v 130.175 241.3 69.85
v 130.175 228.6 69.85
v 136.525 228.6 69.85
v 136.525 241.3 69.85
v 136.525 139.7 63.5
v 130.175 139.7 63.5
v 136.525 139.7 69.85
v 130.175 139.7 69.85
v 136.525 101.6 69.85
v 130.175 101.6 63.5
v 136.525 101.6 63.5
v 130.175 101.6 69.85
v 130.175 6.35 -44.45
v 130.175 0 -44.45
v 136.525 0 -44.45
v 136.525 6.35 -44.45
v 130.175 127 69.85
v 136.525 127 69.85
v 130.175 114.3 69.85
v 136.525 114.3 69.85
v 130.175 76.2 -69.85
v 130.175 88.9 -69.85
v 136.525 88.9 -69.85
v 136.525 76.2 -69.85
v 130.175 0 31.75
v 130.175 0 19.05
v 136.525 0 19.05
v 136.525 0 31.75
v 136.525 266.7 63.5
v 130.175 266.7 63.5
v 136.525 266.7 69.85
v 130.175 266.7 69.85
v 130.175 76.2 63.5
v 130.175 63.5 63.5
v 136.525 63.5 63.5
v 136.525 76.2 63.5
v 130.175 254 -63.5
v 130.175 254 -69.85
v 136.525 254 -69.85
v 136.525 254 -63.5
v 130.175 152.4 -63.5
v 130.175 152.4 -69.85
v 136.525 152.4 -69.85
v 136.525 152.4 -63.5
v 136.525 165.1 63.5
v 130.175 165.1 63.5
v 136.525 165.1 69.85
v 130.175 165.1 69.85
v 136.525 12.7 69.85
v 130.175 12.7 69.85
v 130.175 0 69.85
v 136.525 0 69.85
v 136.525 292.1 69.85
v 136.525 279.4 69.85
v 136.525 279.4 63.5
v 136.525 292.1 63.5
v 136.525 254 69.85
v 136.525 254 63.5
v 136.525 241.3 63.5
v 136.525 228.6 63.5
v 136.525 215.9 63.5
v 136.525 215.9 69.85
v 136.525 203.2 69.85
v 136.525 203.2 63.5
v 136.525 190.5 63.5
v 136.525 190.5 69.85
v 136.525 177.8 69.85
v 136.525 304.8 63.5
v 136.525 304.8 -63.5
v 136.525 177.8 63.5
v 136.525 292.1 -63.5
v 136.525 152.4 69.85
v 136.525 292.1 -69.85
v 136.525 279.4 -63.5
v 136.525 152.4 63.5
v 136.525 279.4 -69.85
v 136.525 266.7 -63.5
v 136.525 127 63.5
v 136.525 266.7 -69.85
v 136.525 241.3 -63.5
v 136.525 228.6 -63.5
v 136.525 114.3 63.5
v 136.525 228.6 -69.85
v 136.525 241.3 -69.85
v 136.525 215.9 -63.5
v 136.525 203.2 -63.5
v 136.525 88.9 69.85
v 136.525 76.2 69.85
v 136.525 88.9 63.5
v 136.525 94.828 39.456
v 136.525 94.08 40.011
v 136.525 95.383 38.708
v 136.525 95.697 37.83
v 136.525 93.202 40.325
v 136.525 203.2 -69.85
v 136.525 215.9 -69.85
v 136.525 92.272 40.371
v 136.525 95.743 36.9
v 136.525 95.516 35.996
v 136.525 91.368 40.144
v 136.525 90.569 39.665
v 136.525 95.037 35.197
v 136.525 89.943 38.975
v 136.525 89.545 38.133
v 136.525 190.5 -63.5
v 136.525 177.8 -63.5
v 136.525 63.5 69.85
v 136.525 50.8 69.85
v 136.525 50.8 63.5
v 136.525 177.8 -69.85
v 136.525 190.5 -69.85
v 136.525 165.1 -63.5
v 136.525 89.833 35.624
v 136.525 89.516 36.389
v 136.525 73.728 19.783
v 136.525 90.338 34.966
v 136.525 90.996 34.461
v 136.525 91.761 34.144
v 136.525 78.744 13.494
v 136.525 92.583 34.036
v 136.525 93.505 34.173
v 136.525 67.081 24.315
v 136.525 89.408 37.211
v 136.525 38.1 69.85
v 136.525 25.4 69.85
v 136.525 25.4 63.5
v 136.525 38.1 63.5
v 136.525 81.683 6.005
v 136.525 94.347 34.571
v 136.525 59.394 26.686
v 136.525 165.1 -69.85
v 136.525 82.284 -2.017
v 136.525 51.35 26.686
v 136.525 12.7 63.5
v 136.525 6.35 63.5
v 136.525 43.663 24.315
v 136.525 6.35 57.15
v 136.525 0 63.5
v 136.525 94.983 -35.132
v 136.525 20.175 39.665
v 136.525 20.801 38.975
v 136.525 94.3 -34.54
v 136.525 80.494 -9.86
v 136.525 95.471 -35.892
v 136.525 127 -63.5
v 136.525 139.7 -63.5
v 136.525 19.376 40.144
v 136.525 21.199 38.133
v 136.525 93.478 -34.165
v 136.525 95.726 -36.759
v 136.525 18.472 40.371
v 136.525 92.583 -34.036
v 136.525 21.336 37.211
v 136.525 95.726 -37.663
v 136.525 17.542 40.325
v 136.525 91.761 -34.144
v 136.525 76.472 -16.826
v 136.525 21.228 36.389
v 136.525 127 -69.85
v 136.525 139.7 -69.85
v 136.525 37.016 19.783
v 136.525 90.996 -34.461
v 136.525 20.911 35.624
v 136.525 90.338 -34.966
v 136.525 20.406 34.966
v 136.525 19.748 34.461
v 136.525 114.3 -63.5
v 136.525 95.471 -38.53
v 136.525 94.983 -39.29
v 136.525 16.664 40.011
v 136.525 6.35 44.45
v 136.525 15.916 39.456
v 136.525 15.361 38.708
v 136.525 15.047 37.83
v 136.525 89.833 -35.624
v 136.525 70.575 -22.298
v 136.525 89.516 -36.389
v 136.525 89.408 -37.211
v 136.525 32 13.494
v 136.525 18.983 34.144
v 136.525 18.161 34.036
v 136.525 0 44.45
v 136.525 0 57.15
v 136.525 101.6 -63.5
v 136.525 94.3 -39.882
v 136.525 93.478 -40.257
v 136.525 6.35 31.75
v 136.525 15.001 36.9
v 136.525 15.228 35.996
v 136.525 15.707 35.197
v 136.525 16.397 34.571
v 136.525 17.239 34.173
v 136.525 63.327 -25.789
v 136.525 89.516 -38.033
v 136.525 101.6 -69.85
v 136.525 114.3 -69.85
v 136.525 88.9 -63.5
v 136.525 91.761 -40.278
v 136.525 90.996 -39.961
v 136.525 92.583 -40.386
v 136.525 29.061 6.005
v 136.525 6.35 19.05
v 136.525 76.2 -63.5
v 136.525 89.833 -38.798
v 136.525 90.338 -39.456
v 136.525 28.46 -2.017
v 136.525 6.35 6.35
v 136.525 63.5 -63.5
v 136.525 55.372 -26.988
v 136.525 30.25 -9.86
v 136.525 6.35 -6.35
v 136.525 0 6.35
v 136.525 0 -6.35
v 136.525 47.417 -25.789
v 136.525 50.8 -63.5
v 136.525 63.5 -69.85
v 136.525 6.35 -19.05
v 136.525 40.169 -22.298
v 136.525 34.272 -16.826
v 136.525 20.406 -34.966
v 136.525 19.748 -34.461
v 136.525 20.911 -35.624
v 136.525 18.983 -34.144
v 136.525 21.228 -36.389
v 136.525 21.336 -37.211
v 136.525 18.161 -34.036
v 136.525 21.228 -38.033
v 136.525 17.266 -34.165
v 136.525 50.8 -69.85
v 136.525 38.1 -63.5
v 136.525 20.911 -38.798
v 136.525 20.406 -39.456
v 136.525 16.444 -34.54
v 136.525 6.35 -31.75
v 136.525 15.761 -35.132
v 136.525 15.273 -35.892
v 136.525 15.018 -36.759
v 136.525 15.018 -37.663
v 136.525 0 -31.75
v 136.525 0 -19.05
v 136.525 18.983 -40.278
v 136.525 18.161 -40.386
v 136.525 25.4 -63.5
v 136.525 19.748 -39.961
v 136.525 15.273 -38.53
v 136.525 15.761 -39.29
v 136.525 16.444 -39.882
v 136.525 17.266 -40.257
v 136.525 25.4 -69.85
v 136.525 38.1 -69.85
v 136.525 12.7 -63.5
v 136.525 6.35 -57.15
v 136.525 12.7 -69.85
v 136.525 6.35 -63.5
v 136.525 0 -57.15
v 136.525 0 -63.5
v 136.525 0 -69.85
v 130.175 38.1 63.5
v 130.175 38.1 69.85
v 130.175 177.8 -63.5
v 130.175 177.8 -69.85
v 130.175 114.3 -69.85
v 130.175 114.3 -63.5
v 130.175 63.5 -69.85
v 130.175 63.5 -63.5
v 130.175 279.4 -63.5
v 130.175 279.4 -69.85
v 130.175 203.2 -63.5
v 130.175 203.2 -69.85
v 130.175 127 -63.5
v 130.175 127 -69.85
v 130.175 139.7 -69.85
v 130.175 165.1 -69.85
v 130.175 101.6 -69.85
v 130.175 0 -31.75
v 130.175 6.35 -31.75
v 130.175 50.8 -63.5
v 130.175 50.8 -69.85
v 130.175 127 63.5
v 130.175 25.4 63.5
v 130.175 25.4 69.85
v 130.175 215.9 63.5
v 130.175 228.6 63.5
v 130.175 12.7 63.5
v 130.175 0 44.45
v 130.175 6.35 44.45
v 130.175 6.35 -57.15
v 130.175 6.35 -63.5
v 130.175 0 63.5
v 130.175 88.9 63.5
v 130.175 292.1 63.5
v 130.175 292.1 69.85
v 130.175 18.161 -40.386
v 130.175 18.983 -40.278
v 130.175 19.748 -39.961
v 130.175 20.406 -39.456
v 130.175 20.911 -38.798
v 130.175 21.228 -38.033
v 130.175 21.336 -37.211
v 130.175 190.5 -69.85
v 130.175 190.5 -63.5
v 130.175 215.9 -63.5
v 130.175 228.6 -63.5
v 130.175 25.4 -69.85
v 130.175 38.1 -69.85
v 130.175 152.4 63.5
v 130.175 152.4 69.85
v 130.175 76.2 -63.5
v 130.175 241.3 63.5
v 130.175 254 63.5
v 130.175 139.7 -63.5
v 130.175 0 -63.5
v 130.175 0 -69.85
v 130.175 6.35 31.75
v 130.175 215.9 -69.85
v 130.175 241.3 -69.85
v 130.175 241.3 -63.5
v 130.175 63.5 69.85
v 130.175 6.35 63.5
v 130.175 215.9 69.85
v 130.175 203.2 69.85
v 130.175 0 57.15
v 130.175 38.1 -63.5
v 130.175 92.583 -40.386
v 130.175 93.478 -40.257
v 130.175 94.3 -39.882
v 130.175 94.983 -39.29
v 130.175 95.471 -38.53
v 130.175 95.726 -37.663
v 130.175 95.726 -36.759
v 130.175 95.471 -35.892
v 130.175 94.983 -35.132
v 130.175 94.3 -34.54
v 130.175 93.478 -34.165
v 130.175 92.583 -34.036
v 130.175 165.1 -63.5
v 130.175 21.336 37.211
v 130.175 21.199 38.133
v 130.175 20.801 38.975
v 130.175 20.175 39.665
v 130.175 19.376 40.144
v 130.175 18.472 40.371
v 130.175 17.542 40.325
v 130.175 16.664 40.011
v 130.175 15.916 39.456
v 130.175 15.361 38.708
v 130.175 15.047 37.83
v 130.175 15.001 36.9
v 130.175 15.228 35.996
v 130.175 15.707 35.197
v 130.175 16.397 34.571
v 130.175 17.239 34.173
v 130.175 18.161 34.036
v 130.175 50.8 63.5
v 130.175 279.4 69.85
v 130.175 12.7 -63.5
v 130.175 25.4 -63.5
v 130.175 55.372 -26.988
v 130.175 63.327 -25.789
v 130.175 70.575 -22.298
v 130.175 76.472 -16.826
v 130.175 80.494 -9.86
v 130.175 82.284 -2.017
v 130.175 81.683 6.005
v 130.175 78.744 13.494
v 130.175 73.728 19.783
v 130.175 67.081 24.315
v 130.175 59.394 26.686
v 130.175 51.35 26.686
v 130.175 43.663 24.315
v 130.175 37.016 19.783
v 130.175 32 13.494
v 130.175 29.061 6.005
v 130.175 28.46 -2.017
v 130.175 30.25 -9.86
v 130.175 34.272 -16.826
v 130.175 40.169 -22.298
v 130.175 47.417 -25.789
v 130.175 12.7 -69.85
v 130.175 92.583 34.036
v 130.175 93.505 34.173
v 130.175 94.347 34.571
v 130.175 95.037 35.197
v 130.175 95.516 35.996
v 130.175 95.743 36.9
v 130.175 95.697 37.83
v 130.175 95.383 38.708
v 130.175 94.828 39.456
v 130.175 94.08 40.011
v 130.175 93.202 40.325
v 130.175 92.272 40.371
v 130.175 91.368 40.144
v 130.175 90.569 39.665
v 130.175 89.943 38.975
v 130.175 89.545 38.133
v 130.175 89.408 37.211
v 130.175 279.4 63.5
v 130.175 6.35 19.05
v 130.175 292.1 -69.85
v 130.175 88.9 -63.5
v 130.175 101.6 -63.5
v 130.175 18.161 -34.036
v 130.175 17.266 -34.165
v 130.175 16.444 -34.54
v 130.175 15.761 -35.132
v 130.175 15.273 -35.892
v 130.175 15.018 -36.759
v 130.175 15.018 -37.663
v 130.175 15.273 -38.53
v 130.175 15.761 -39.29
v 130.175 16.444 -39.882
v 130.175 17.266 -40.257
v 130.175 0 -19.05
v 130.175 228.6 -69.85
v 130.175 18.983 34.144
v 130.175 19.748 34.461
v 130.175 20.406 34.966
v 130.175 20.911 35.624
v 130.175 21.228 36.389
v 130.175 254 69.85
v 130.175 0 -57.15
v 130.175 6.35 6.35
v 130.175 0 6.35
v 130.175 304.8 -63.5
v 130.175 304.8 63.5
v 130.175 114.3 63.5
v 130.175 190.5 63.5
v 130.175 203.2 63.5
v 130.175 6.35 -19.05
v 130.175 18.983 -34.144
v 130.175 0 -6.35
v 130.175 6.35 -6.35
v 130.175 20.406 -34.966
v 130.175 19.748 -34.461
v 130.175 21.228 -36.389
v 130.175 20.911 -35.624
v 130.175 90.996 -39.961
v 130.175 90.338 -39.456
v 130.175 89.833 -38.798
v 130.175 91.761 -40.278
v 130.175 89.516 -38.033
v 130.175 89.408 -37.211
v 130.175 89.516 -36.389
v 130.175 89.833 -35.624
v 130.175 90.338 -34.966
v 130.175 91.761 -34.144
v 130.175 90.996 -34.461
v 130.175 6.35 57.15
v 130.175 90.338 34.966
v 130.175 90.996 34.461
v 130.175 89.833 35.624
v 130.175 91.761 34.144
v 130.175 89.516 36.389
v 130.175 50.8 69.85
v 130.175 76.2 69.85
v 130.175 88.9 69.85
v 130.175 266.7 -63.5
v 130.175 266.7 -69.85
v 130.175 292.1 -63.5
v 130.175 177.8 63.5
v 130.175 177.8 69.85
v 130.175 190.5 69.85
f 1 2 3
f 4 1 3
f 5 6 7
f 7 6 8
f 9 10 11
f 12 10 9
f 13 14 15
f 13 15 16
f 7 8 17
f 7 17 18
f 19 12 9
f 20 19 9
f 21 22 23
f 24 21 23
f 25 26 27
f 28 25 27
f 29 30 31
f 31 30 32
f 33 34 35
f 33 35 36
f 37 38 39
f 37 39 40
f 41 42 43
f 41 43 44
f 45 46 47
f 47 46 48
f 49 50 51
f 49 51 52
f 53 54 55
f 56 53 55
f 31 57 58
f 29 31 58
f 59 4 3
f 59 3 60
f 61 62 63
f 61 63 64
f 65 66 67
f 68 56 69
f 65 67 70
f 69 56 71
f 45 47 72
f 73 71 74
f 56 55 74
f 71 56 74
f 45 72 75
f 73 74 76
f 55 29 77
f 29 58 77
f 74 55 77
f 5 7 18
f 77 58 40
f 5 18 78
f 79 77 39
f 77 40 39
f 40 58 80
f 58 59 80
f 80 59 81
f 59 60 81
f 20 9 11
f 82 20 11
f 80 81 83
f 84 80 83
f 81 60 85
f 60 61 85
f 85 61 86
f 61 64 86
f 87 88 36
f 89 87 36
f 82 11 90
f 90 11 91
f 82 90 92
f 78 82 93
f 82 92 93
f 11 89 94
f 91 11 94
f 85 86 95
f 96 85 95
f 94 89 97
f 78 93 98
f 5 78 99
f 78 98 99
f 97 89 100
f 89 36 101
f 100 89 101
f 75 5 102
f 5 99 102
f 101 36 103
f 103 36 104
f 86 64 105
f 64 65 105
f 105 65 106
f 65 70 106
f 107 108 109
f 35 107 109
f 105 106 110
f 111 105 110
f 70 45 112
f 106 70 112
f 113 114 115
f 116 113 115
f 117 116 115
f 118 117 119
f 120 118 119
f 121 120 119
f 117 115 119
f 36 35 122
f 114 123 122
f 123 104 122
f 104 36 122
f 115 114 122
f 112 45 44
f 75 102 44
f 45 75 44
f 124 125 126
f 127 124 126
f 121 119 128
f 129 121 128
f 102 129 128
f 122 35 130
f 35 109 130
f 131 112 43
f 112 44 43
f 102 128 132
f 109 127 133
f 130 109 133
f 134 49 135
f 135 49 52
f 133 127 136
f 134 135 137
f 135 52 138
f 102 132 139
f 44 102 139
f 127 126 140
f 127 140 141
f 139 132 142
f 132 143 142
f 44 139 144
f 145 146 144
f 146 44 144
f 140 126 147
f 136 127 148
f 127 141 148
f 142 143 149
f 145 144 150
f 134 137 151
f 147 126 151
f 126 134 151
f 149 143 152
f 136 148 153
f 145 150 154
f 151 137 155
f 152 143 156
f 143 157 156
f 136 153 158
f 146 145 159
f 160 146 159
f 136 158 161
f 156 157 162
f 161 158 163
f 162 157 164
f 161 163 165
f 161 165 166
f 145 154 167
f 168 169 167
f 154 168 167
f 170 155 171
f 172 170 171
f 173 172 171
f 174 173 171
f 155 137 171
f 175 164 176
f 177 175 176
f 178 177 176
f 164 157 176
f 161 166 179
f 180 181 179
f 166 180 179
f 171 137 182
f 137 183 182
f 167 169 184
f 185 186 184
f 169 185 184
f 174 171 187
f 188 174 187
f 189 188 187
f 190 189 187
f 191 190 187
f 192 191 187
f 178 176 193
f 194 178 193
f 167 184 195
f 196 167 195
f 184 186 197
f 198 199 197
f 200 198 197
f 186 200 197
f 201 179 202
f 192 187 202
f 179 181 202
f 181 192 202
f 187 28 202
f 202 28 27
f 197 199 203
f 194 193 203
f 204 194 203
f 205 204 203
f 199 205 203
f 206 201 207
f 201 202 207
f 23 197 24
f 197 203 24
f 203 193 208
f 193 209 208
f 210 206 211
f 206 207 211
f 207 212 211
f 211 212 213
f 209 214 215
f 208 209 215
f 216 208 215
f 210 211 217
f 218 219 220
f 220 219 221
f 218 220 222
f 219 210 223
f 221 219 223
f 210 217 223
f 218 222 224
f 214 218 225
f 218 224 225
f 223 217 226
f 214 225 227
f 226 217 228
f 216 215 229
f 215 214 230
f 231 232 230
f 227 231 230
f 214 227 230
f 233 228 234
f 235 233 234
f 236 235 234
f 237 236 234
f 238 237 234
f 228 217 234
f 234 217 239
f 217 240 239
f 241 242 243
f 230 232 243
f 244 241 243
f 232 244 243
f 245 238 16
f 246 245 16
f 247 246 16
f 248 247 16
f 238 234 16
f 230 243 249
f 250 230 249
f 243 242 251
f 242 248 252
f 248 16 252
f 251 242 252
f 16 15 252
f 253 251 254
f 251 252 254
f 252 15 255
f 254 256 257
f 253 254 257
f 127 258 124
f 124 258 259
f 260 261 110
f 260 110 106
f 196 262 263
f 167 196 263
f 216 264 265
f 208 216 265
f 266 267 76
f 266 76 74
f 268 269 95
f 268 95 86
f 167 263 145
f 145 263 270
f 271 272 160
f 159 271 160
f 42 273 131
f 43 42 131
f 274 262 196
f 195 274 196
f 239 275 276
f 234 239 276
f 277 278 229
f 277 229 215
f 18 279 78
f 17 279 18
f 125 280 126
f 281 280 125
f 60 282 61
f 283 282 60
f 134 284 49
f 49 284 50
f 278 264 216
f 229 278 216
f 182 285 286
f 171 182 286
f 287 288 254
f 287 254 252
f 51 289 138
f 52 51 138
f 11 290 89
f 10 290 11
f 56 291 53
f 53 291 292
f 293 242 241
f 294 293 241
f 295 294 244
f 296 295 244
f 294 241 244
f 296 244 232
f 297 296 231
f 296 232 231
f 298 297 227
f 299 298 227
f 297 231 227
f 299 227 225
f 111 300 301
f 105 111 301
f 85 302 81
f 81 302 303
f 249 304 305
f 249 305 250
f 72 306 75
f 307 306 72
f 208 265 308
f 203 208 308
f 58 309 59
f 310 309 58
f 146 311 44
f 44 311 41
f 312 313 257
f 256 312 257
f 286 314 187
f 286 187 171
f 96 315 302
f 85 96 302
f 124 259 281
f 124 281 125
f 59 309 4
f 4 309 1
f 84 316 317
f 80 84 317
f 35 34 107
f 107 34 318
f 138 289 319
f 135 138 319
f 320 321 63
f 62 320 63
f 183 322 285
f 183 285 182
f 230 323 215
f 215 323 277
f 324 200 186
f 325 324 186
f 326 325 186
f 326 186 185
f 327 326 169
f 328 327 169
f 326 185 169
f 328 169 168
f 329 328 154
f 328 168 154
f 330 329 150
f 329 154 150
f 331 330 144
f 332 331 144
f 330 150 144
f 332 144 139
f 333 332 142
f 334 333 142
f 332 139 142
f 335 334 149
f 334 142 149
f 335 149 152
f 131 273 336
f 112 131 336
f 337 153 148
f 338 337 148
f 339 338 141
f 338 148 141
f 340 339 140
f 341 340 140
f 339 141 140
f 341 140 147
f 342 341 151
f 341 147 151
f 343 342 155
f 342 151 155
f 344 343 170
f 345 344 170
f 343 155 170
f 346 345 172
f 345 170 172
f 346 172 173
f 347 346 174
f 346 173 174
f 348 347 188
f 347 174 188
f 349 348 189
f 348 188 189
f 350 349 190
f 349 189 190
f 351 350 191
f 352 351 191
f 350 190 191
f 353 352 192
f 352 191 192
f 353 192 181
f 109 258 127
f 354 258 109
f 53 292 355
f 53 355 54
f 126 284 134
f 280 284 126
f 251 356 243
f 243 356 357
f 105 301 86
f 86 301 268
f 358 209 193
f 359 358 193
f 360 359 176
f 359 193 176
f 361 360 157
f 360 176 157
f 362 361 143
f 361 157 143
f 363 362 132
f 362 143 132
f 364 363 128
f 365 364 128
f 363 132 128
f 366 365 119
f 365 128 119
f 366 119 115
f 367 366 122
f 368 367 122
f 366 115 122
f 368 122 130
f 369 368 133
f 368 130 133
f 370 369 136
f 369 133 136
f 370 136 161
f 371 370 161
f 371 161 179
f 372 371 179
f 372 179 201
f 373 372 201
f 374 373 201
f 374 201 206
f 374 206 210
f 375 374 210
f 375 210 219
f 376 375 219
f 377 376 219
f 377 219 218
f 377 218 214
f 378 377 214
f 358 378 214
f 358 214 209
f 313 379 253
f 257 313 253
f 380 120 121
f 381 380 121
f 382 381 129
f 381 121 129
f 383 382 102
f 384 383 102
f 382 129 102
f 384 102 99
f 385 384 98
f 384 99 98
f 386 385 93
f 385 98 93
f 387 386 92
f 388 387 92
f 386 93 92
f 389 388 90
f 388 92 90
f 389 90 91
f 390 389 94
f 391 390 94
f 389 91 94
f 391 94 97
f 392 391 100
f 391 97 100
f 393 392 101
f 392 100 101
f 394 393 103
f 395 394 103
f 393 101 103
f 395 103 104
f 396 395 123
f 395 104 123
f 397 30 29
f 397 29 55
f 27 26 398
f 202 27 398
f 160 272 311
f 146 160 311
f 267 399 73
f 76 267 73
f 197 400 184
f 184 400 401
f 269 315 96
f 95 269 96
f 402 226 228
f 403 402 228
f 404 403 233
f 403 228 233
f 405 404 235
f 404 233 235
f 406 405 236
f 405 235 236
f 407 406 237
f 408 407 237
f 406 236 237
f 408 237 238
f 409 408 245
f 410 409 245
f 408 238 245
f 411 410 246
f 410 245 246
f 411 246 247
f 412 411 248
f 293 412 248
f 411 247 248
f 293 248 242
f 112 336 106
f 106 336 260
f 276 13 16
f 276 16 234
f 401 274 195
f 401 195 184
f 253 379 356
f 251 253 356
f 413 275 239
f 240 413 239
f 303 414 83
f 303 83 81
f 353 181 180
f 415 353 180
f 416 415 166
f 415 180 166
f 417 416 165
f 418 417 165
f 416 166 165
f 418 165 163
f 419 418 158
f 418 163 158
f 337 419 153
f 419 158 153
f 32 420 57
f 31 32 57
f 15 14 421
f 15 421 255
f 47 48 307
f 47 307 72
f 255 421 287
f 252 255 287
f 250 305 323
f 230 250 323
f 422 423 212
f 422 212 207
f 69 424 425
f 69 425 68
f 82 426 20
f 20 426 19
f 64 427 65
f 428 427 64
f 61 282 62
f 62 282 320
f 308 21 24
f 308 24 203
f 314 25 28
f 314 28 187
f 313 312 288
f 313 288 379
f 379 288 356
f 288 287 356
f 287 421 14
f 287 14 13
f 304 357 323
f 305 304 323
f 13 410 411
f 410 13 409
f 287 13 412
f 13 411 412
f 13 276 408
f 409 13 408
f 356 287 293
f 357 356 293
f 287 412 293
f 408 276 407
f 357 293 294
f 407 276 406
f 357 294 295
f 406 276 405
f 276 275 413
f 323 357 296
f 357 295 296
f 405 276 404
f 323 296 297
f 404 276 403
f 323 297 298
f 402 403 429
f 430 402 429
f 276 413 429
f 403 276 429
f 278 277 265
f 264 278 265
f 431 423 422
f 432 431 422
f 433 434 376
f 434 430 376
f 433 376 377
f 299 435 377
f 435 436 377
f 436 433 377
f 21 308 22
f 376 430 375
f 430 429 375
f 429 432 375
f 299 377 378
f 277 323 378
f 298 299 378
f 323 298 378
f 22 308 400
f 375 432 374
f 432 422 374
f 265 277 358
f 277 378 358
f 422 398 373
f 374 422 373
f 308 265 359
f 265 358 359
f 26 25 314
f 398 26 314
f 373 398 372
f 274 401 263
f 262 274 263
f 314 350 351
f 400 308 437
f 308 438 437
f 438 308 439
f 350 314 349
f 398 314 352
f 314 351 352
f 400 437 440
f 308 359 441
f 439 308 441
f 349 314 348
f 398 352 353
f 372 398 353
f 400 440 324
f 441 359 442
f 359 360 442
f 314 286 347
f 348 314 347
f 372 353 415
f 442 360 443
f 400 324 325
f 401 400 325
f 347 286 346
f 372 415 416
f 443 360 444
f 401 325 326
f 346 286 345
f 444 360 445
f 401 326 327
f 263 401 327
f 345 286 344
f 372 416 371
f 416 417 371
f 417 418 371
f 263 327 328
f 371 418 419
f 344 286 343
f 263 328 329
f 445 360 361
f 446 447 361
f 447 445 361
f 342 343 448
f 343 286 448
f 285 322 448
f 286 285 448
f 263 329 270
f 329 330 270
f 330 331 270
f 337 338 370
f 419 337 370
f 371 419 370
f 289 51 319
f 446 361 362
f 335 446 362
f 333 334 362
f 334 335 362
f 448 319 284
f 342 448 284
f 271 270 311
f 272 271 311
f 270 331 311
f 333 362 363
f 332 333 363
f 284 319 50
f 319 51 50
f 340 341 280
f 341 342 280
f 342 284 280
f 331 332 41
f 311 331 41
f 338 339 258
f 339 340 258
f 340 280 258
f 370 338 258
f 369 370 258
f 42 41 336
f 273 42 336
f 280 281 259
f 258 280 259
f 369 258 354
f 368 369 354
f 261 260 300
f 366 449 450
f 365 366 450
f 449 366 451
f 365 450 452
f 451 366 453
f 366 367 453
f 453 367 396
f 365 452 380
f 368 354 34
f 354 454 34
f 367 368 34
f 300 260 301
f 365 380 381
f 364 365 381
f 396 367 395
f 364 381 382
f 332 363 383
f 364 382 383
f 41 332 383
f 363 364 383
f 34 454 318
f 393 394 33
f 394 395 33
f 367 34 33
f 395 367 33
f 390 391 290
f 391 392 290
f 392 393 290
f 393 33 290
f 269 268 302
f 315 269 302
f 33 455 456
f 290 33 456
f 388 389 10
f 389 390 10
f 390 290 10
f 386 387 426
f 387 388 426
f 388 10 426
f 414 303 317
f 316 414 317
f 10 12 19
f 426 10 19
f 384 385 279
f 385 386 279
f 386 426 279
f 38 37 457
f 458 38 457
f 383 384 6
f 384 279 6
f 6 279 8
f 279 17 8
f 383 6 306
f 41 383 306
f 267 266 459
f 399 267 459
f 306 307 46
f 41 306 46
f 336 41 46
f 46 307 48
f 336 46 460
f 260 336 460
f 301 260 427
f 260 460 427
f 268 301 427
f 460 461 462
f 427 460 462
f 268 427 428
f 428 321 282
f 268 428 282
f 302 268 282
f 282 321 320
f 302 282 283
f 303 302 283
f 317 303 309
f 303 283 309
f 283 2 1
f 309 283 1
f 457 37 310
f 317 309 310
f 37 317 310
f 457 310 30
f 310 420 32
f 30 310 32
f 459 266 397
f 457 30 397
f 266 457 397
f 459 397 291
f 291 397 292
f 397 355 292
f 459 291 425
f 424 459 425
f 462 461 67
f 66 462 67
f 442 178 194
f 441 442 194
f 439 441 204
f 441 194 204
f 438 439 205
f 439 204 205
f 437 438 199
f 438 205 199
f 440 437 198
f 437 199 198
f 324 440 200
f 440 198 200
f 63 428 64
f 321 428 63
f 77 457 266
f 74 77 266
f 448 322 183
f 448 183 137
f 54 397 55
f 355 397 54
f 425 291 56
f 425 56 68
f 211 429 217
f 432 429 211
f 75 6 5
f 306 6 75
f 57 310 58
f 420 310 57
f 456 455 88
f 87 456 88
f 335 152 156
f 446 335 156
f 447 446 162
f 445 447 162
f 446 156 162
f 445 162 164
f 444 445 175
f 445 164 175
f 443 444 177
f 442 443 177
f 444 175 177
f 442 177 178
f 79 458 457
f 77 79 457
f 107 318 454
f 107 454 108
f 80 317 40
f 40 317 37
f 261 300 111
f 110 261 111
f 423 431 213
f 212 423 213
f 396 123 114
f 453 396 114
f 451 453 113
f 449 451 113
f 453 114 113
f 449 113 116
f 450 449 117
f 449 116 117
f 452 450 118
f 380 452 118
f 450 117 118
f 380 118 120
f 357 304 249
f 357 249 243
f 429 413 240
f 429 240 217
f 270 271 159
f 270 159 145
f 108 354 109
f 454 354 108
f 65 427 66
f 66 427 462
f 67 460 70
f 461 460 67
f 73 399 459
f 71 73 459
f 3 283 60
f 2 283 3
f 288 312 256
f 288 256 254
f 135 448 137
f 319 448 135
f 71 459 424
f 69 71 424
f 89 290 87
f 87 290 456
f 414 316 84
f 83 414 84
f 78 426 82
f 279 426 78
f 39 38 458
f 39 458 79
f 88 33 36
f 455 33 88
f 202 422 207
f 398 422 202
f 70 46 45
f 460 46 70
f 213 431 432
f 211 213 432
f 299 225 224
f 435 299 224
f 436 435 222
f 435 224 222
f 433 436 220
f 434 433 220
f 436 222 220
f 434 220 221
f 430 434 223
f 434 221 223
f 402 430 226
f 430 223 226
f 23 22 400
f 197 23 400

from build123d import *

# Parameters (mm, degrees)
SKETCH1_W              = 273.05
SKETCH1_H              = 139.7
BOSS_EXTRUDE1_DEPTH    = 6.35
SKETCH2_W              = 273.05
SKETCH2_H              = 139.7
SKETCH2_W_2            = 260.35
SKETCH2_H_2            = 127
BOSS_EXTRUDE2_DEPTH    = 298.45
SKETCH3_W              = 6.35
SKETCH3_H              = 16.933333333
SKETCH3_H_2            = 16.933333334
DOOR_SLOT_DEPTH        = 12.7
DOOR_GUIDE_HOLES_REACH = 361.617
SKETCH4_W              = 6.35
SKETCH4_H              = 15.875
LEVER_HOLES_W          = 9.652
LEVER_HOLES_H          = 6.35
LEVER_HOLES_W_2        = 6.35
CUT_EXTRUDE1_DEPTH     = 363.019620497
CUT_EXTRUDE2_REACH     = 417.137
SKETCH7_R              = 26.9875
CUT_EXTRUDE3_REACH     = 417.137
SKETCH8_R              = 3.175
SKETCH16_W             = 326.476778096
SKETCH16_H             = 315.233565403
CUT_EXTRUDE10_DEPTH    = 363.019620497
LEFT_RIGHT_W           = 6.35
LEFT_RIGHT_H           = 6.35
LEFT_RIGHT_W_2         = 12.7
LEFT_RIGHT_H_2         = 12.7
CUT_EXTRUDE11_DEPTH    = 416.136561869


with BuildPart() as part:
    # Sketch1 → Boss-Extrude1 (new body)
    with BuildSketch(Plane(origin=(0, 0, 0), x_dir=(1, 0, 0), z_dir=(0, 1, 0))):
        Rectangle(SKETCH1_W, SKETCH1_H)
    extrude(amount=BOSS_EXTRUDE1_DEPTH)

    # Sketch2 → Boss-Extrude2 (add)
    with BuildSketch(Plane(origin=(0, 6.35, 0), x_dir=(1, 0, 0), z_dir=(0, 1, 0))):
        Rectangle(SKETCH2_W, SKETCH2_H)
        Rectangle(SKETCH2_W_2, SKETCH2_H_2, mode=Mode.SUBTRACT)
    extrude(amount=BOSS_EXTRUDE2_DEPTH)

    # Sketch3 → Door Slot (cut)
    with BuildSketch(Plane.XY.offset(69.85)):
        with BuildLine():
            Line((-28.575, 283.21), (-28.575, 6.35))
            Line((-28.575, 6.35), (-21.971, 6.35))
            Line((-21.971, 6.35), (-21.971, 292.354))
            Line((-21.971, 292.354), (-41.529, 292.354))
            Line((-41.529, 292.354), (-41.529, 285.75))
            Line((-41.529, 285.75), (-31.115, 285.75))
            ThreePointArc((-31.115, 285.75), (-29.318948776, 285.006051224), (-28.575, 283.21))
        make_face()
        with Locations((-12.446, 80.433333334)):
            Rectangle(SKETCH3_W, SKETCH3_H)
        with Locations((-12.446, 50.8)):
            Rectangle(SKETCH3_W, SKETCH3_H_2)
        with Locations((-12.446, 21.166666667)):
            Rectangle(SKETCH3_W, SKETCH3_H)
    extrude(amount=-DOOR_SLOT_DEPTH, mode=Mode.SUBTRACT)

    # Sketch4 → Door Guide Holes (cut, up to next)
    with BuildSketch(Plane.XY.offset(-63.5), mode=Mode.PRIVATE) as door_guide_holes_sk1:
        with Locations((-44.704, 284.1625)):
            Rectangle(SKETCH4_W, SKETCH4_H)
    door_guide_holes_tool1 = extrude(door_guide_holes_sk1.sketch, amount=-DOOR_GUIDE_HOLES_REACH, mode=Mode.PRIVATE) & part.part
    # Sketch4 → Door Guide Holes (cut, up to next)
    with BuildSketch(Plane.XY.offset(-63.5), mode=Mode.PRIVATE) as door_guide_holes_sk2:
        with Locations((-44.704, 255.5875)):
            Rectangle(SKETCH4_W, SKETCH4_H)
    door_guide_holes_tool2 = extrude(door_guide_holes_sk2.sketch, amount=-DOOR_GUIDE_HOLES_REACH, mode=Mode.PRIVATE) & part.part
    # Sketch4 → Door Guide Holes (cut, up to next)
    with BuildSketch(Plane.XY.offset(-63.5), mode=Mode.PRIVATE) as door_guide_holes_sk3:
        with Locations((-44.704, 227.0125)):
            Rectangle(SKETCH4_W, SKETCH4_H)
    door_guide_holes_tool3 = extrude(door_guide_holes_sk3.sketch, amount=-DOOR_GUIDE_HOLES_REACH, mode=Mode.PRIVATE) & part.part
    # Sketch4 → Door Guide Holes (cut, up to next)
    with BuildSketch(Plane.XY.offset(-63.5), mode=Mode.PRIVATE) as door_guide_holes_sk4:
        with Locations((-44.704, 198.4375)):
            Rectangle(SKETCH4_W, SKETCH4_H)
    door_guide_holes_tool4 = extrude(door_guide_holes_sk4.sketch, amount=-DOOR_GUIDE_HOLES_REACH, mode=Mode.PRIVATE) & part.part
    # Sketch4 → Door Guide Holes (cut, up to next)
    with BuildSketch(Plane.XY.offset(-63.5), mode=Mode.PRIVATE) as door_guide_holes_sk5:
        with Locations((-44.704, 169.8625)):
            Rectangle(SKETCH4_W, SKETCH4_H)
    door_guide_holes_tool5 = extrude(door_guide_holes_sk5.sketch, amount=-DOOR_GUIDE_HOLES_REACH, mode=Mode.PRIVATE) & part.part
    # Sketch4 → Door Guide Holes (cut, up to next)
    with BuildSketch(Plane.XY.offset(-63.5), mode=Mode.PRIVATE) as door_guide_holes_sk6:
        with Locations((-44.704, 141.2875)):
            Rectangle(SKETCH4_W, SKETCH4_H)
    door_guide_holes_tool6 = extrude(door_guide_holes_sk6.sketch, amount=-DOOR_GUIDE_HOLES_REACH, mode=Mode.PRIVATE) & part.part
    # Sketch4 → Door Guide Holes (cut, up to next)
    with BuildSketch(Plane.XY.offset(-63.5), mode=Mode.PRIVATE) as door_guide_holes_sk7:
        with Locations((-44.704, 112.7125)):
            Rectangle(SKETCH4_W, SKETCH4_H)
    door_guide_holes_tool7 = extrude(door_guide_holes_sk7.sketch, amount=-DOOR_GUIDE_HOLES_REACH, mode=Mode.PRIVATE) & part.part
    # Sketch4 → Door Guide Holes (cut, up to next)
    with BuildSketch(Plane.XY.offset(-63.5), mode=Mode.PRIVATE) as door_guide_holes_sk8:
        with Locations((-44.704, 84.1375)):
            Rectangle(SKETCH4_W, SKETCH4_H)
    door_guide_holes_tool8 = extrude(door_guide_holes_sk8.sketch, amount=-DOOR_GUIDE_HOLES_REACH, mode=Mode.PRIVATE) & part.part
    # Sketch4 → Door Guide Holes (cut, up to next)
    with BuildSketch(Plane.XY.offset(-63.5), mode=Mode.PRIVATE) as door_guide_holes_sk9:
        with Locations((-44.704, 55.5625)):
            Rectangle(SKETCH4_W, SKETCH4_H)
    door_guide_holes_tool9 = extrude(door_guide_holes_sk9.sketch, amount=-DOOR_GUIDE_HOLES_REACH, mode=Mode.PRIVATE) & part.part
    # Sketch4 → Door Guide Holes (cut, up to next)
    with BuildSketch(Plane.XY.offset(-63.5), mode=Mode.PRIVATE) as door_guide_holes_sk10:
        with Locations((-44.704, 26.9875)):
            Rectangle(SKETCH4_W, SKETCH4_H)
    door_guide_holes_tool10 = extrude(door_guide_holes_sk10.sketch, amount=-DOOR_GUIDE_HOLES_REACH, mode=Mode.PRIVATE) & part.part
    door_guide_holes_1 = door_guide_holes_tool1.solids().sort_by_distance((-44.704, 284.1625, -63.5))[0]
    add(door_guide_holes_1, mode=Mode.SUBTRACT)
    door_guide_holes_2 = door_guide_holes_tool2.solids().sort_by_distance((-44.704, 255.5875, -63.5))[0]
    add(door_guide_holes_2, mode=Mode.SUBTRACT)
    door_guide_holes_3 = door_guide_holes_tool3.solids().sort_by_distance((-44.704, 227.0125, -63.5))[0]
    add(door_guide_holes_3, mode=Mode.SUBTRACT)
    door_guide_holes_4 = door_guide_holes_tool4.solids().sort_by_distance((-44.704, 198.4375, -63.5))[0]
    add(door_guide_holes_4, mode=Mode.SUBTRACT)
    door_guide_holes_5 = door_guide_holes_tool5.solids().sort_by_distance((-44.704, 169.8625, -63.5))[0]
    add(door_guide_holes_5, mode=Mode.SUBTRACT)
    door_guide_holes_6 = door_guide_holes_tool6.solids().sort_by_distance((-44.704, 141.2875, -63.5))[0]
    add(door_guide_holes_6, mode=Mode.SUBTRACT)
    door_guide_holes_7 = door_guide_holes_tool7.solids().sort_by_distance((-44.704, 112.7125, -63.5))[0]
    add(door_guide_holes_7, mode=Mode.SUBTRACT)
    door_guide_holes_8 = door_guide_holes_tool8.solids().sort_by_distance((-44.704, 84.1375, -63.5))[0]
    add(door_guide_holes_8, mode=Mode.SUBTRACT)
    door_guide_holes_9 = door_guide_holes_tool9.solids().sort_by_distance((-44.704, 55.5625, -63.5))[0]
    add(door_guide_holes_9, mode=Mode.SUBTRACT)
    door_guide_holes_10 = door_guide_holes_tool10.solids().sort_by_distance((-44.704, 26.9875, -63.5))[0]
    add(door_guide_holes_10, mode=Mode.SUBTRACT)
    door_guide_holes = door_guide_holes_1 + door_guide_holes_2 + door_guide_holes_3 + door_guide_holes_4 + door_guide_holes_5 + door_guide_holes_6 + door_guide_holes_7 + door_guide_holes_8 + door_guide_holes_9 + door_guide_holes_10  # Door Guide Holes as one shape, for the pattern or mirror that repeats it

    # Mirror1: Door Guide Holes across plane
    add(door_guide_holes.mirror(Plane.ZY.offset(31.75)), mode=Mode.SUBTRACT)

    # Lever Holes → Cut-Extrude1 (cut, through all)
    with BuildSketch(Plane.XY.offset(69.85)):
        with Locations((54.102, 28.575)):
            Rectangle(LEVER_HOLES_W, LEVER_HOLES_H)
        with Locations((39.3065, 15.875)):
            Rectangle(LEVER_HOLES_W_2, LEVER_HOLES_H)
        with Locations((68.8975, 15.875)):
            Rectangle(LEVER_HOLES_W_2, LEVER_HOLES_H)
    extrude(amount=-CUT_EXTRUDE1_DEPTH, mode=Mode.SUBTRACT)

    # Sketch7 → Cut-Extrude2 (cut, up to next)
    with BuildSketch(Plane(origin=(136.525, 0, 0), x_dir=(0, 0, -1), z_dir=(1, 0, 0)), mode=Mode.PRIVATE) as cut_extrude2_sk1:
        with Locations((0, 55.372)):
            Circle(SKETCH7_R)
    cut_extrude2_tool1 = extrude(cut_extrude2_sk1.sketch, amount=-CUT_EXTRUDE2_REACH, mode=Mode.PRIVATE) & part.part
    # Sketch7 → Cut-Extrude2 (cut, up to next)
    with BuildSketch(Plane(origin=(136.525, 0, 0), x_dir=(0, 0, -1), z_dir=(1, 0, 0)), mode=Mode.PRIVATE) as cut_extrude2_sk2:
        with BuildLine():
            Line((-37.211, 89.408), (-37.211, 92.583))
            Line((-37.211, 92.583), (-34.036, 92.583))
            ThreePointArc((-34.036, 92.583), (-39.45606403, 94.82806403), (-37.211, 89.408))
        make_face()
    cut_extrude2_tool2 = extrude(cut_extrude2_sk2.sketch, amount=-CUT_EXTRUDE2_REACH, mode=Mode.PRIVATE) & part.part
    # Sketch7 → Cut-Extrude2 (cut, up to next)
    with BuildSketch(Plane(origin=(136.525, 0, 0), x_dir=(0, 0, -1), z_dir=(1, 0, 0)), mode=Mode.PRIVATE) as cut_extrude2_sk3:
        with BuildLine():
            Line((-34.036, 92.583), (-37.211, 92.583))
            Line((-37.211, 92.583), (-37.211, 89.408))
            ThreePointArc((-37.211, 89.408), (-34.96593597, 90.33793597), (-34.036, 92.583))
        make_face()
    cut_extrude2_tool3 = extrude(cut_extrude2_sk3.sketch, amount=-CUT_EXTRUDE2_REACH, mode=Mode.PRIVATE) & part.part
    # Sketch7 → Cut-Extrude2 (cut, up to next)
    with BuildSketch(Plane(origin=(136.525, 0, 0), x_dir=(0, 0, -1), z_dir=(1, 0, 0)), mode=Mode.PRIVATE) as cut_extrude2_sk4:
        with BuildLine():
            Line((-37.211, 89.408), (-37.211, 92.583))
            Line((-37.211, 92.583), (-34.036, 92.583))
            ThreePointArc((-34.036, 92.583), (-39.45606403, 94.82806403), (-37.211, 89.408))
        make_face()
    cut_extrude2_tool4 = extrude(cut_extrude2_sk4.sketch, amount=-CUT_EXTRUDE2_REACH, mode=Mode.PRIVATE) & part.part
    # Sketch7 → Cut-Extrude2 (cut, up to next)
    with BuildSketch(Plane(origin=(136.525, 0, 0), x_dir=(0, 0, -1), z_dir=(1, 0, 0)), mode=Mode.PRIVATE) as cut_extrude2_sk5:
        with BuildLine():
            Line((-34.036, 92.583), (-37.211, 92.583))
            Line((-37.211, 92.583), (-37.211, 89.408))
            ThreePointArc((-37.211, 89.408), (-34.96593597, 90.33793597), (-34.036, 92.583))
        make_face()
    cut_extrude2_tool5 = extrude(cut_extrude2_sk5.sketch, amount=-CUT_EXTRUDE2_REACH, mode=Mode.PRIVATE) & part.part
    # Sketch7 → Cut-Extrude2 (cut, up to next)
    with BuildSketch(Plane(origin=(136.525, 0, 0), x_dir=(0, 0, -1), z_dir=(1, 0, 0)), mode=Mode.PRIVATE) as cut_extrude2_sk6:
        with BuildLine():
            ThreePointArc((40.386, 92.583), (37.211, 95.758), (34.036, 92.583))
            Line((34.036, 92.583), (37.211, 92.583))
            Line((37.211, 92.583), (37.211, 89.408))
            ThreePointArc((37.211, 89.408), (39.45606403, 90.33793597), (40.386, 92.583))
        make_face()
    cut_extrude2_tool6 = extrude(cut_extrude2_sk6.sketch, amount=-CUT_EXTRUDE2_REACH, mode=Mode.PRIVATE) & part.part
    # Sketch7 → Cut-Extrude2 (cut, up to next)
    with BuildSketch(Plane(origin=(136.525, 0, 0), x_dir=(0, 0, -1), z_dir=(1, 0, 0)), mode=Mode.PRIVATE) as cut_extrude2_sk7:
        with BuildLine():
            Line((37.211, 92.583), (34.036, 92.583))
            ThreePointArc((34.036, 92.583), (34.96593597, 90.33793597), (37.211, 89.408))
            Line((37.211, 89.408), (37.211, 92.583))
        make_face()
    cut_extrude2_tool7 = extrude(cut_extrude2_sk7.sketch, amount=-CUT_EXTRUDE2_REACH, mode=Mode.PRIVATE) & part.part
    # Sketch7 → Cut-Extrude2 (cut, up to next)
    with BuildSketch(Plane(origin=(136.525, 0, 0), x_dir=(0, 0, -1), z_dir=(1, 0, 0)), mode=Mode.PRIVATE) as cut_extrude2_sk8:
        with BuildLine():
            ThreePointArc((40.386, 92.583), (37.211, 95.758), (34.036, 92.583))
            Line((34.036, 92.583), (37.211, 92.583))
            Line((37.211, 92.583), (37.211, 89.408))
            ThreePointArc((37.211, 89.408), (39.45606403, 90.33793597), (40.386, 92.583))
        make_face()
    cut_extrude2_tool8 = extrude(cut_extrude2_sk8.sketch, amount=-CUT_EXTRUDE2_REACH, mode=Mode.PRIVATE) & part.part
    # Sketch7 → Cut-Extrude2 (cut, up to next)
    with BuildSketch(Plane(origin=(136.525, 0, 0), x_dir=(0, 0, -1), z_dir=(1, 0, 0)), mode=Mode.PRIVATE) as cut_extrude2_sk9:
        with BuildLine():
            Line((37.211, 92.583), (34.036, 92.583))
            ThreePointArc((34.036, 92.583), (34.96593597, 90.33793597), (37.211, 89.408))
            Line((37.211, 89.408), (37.211, 92.583))
        make_face()
    cut_extrude2_tool9 = extrude(cut_extrude2_sk9.sketch, amount=-CUT_EXTRUDE2_REACH, mode=Mode.PRIVATE) & part.part
    # Sketch7 → Cut-Extrude2 (cut, up to next)
    with BuildSketch(Plane(origin=(136.525, 0, 0), x_dir=(0, 0, -1), z_dir=(1, 0, 0)), mode=Mode.PRIVATE) as cut_extrude2_sk10:
        with BuildLine():
            ThreePointArc((-34.036, 18.161), (-34.96593597, 20.40606403), (-37.211, 21.336))
            Line((-37.211, 21.336), (-37.211, 18.161))
            Line((-37.211, 18.161), (-34.036, 18.161))
        make_face()
    cut_extrude2_tool10 = extrude(cut_extrude2_sk10.sketch, amount=-CUT_EXTRUDE2_REACH, mode=Mode.PRIVATE) & part.part
    # Sketch7 → Cut-Extrude2 (cut, up to next)
    with BuildSketch(Plane(origin=(136.525, 0, 0), x_dir=(0, 0, -1), z_dir=(1, 0, 0)), mode=Mode.PRIVATE) as cut_extrude2_sk11:
        with BuildLine():
            Line((-37.211, 18.161), (-37.211, 21.336))
            ThreePointArc((-37.211, 21.336), (-39.45606403, 15.91593597), (-34.036, 18.161))
            Line((-34.036, 18.161), (-37.211, 18.161))
        make_face()
    cut_extrude2_tool11 = extrude(cut_extrude2_sk11.sketch, amount=-CUT_EXTRUDE2_REACH, mode=Mode.PRIVATE) & part.part
    # Sketch7 → Cut-Extrude2 (cut, up to next)
    with BuildSketch(Plane(origin=(136.525, 0, 0), x_dir=(0, 0, -1), z_dir=(1, 0, 0)), mode=Mode.PRIVATE) as cut_extrude2_sk12:
        with BuildLine():
            ThreePointArc((-34.036, 18.161), (-34.96593597, 20.40606403), (-37.211, 21.336))
            Line((-37.211, 21.336), (-37.211, 18.161))
            Line((-37.211, 18.161), (-34.036, 18.161))
        make_face()
    cut_extrude2_tool12 = extrude(cut_extrude2_sk12.sketch, amount=-CUT_EXTRUDE2_REACH, mode=Mode.PRIVATE) & part.part
    # Sketch7 → Cut-Extrude2 (cut, up to next)
    with BuildSketch(Plane(origin=(136.525, 0, 0), x_dir=(0, 0, -1), z_dir=(1, 0, 0)), mode=Mode.PRIVATE) as cut_extrude2_sk13:
        with BuildLine():
            Line((-37.211, 18.161), (-37.211, 21.336))
            ThreePointArc((-37.211, 21.336), (-39.45606403, 15.91593597), (-34.036, 18.161))
            Line((-34.036, 18.161), (-37.211, 18.161))
        make_face()
    cut_extrude2_tool13 = extrude(cut_extrude2_sk13.sketch, amount=-CUT_EXTRUDE2_REACH, mode=Mode.PRIVATE) & part.part
    # Sketch7 → Cut-Extrude2 (cut, up to next)
    with BuildSketch(Plane(origin=(136.525, 0, 0), x_dir=(0, 0, -1), z_dir=(1, 0, 0)), mode=Mode.PRIVATE) as cut_extrude2_sk14:
        with BuildLine():
            ThreePointArc((40.386, 18.161), (39.45606403, 20.40606403), (37.211, 21.336))
            Line((37.211, 21.336), (37.211, 18.161))
            Line((37.211, 18.161), (34.036, 18.161))
            ThreePointArc((34.036, 18.161), (37.211, 14.986), (40.386, 18.161))
        make_face()
    cut_extrude2_tool14 = extrude(cut_extrude2_sk14.sketch, amount=-CUT_EXTRUDE2_REACH, mode=Mode.PRIVATE) & part.part
    # Sketch7 → Cut-Extrude2 (cut, up to next)
    with BuildSketch(Plane(origin=(136.525, 0, 0), x_dir=(0, 0, -1), z_dir=(1, 0, 0)), mode=Mode.PRIVATE) as cut_extrude2_sk15:
        with BuildLine():
            Line((37.211, 18.161), (37.211, 21.336))
            ThreePointArc((37.211, 21.336), (34.96593597, 20.40606403), (34.036, 18.161))
            Line((34.036, 18.161), (37.211, 18.161))
        make_face()
    cut_extrude2_tool15 = extrude(cut_extrude2_sk15.sketch, amount=-CUT_EXTRUDE2_REACH, mode=Mode.PRIVATE) & part.part
    # Sketch7 → Cut-Extrude2 (cut, up to next)
    with BuildSketch(Plane(origin=(136.525, 0, 0), x_dir=(0, 0, -1), z_dir=(1, 0, 0)), mode=Mode.PRIVATE) as cut_extrude2_sk16:
        with BuildLine():
            ThreePointArc((40.386, 18.161), (39.45606403, 20.40606403), (37.211, 21.336))
            Line((37.211, 21.336), (37.211, 18.161))
            Line((37.211, 18.161), (34.036, 18.161))
            ThreePointArc((34.036, 18.161), (37.211, 14.986), (40.386, 18.161))
        make_face()
    cut_extrude2_tool16 = extrude(cut_extrude2_sk16.sketch, amount=-CUT_EXTRUDE2_REACH, mode=Mode.PRIVATE) & part.part
    # Sketch7 → Cut-Extrude2 (cut, up to next)
    with BuildSketch(Plane(origin=(136.525, 0, 0), x_dir=(0, 0, -1), z_dir=(1, 0, 0)), mode=Mode.PRIVATE) as cut_extrude2_sk17:
        with BuildLine():
            Line((37.211, 18.161), (37.211, 21.336))
            ThreePointArc((37.211, 21.336), (34.96593597, 20.40606403), (34.036, 18.161))
            Line((34.036, 18.161), (37.211, 18.161))
        make_face()
    cut_extrude2_tool17 = extrude(cut_extrude2_sk17.sketch, amount=-CUT_EXTRUDE2_REACH, mode=Mode.PRIVATE) & part.part
    add(cut_extrude2_tool1.solids().sort_by_distance((136.525, 55.372, 0))[0], mode=Mode.SUBTRACT)
    add(cut_extrude2_tool2.solids().sort_by_distance((136.525, 93.032171, 37.660171))[0], mode=Mode.SUBTRACT)
    add(cut_extrude2_tool3.solids().sort_by_distance((136.525, 91.235488, 35.863488))[0], mode=Mode.SUBTRACT)
    add(cut_extrude2_tool4.solids().sort_by_distance((136.525, 93.032171, 37.660171))[0], mode=Mode.SUBTRACT)
    add(cut_extrude2_tool5.solids().sort_by_distance((136.525, 91.235488, 35.863488))[0], mode=Mode.SUBTRACT)
    add(cut_extrude2_tool6.solids().sort_by_distance((136.525, 93.032171, -37.660171))[0], mode=Mode.SUBTRACT)
    add(cut_extrude2_tool7.solids().sort_by_distance((136.525, 91.235488, -35.863488))[0], mode=Mode.SUBTRACT)
    add(cut_extrude2_tool8.solids().sort_by_distance((136.525, 93.032171, -37.660171))[0], mode=Mode.SUBTRACT)
    add(cut_extrude2_tool9.solids().sort_by_distance((136.525, 91.235488, -35.863488))[0], mode=Mode.SUBTRACT)
    add(cut_extrude2_tool10.solids().sort_by_distance((136.525, 19.508512, 35.863488))[0], mode=Mode.SUBTRACT)
    add(cut_extrude2_tool11.solids().sort_by_distance((136.525, 17.711829, 37.660171))[0], mode=Mode.SUBTRACT)
    add(cut_extrude2_tool12.solids().sort_by_distance((136.525, 19.508512, 35.863488))[0], mode=Mode.SUBTRACT)
    add(cut_extrude2_tool13.solids().sort_by_distance((136.525, 17.711829, 37.660171))[0], mode=Mode.SUBTRACT)
    add(cut_extrude2_tool14.solids().sort_by_distance((136.525, 17.711829, -37.660171))[0], mode=Mode.SUBTRACT)
    add(cut_extrude2_tool15.solids().sort_by_distance((136.525, 19.508512, -35.863488))[0], mode=Mode.SUBTRACT)
    add(cut_extrude2_tool16.solids().sort_by_distance((136.525, 17.711829, -37.660171))[0], mode=Mode.SUBTRACT)
    add(cut_extrude2_tool17.solids().sort_by_distance((136.525, 19.508512, -35.863488))[0], mode=Mode.SUBTRACT)

    # Sketch8 → Cut-Extrude3 (cut, up to next)
    with BuildSketch(Plane.ZY.offset(136.525), mode=Mode.PRIVATE) as cut_extrude3_sk1:
        with Locations((0, 19.05)):
            Circle(SKETCH8_R)
    cut_extrude3_tool1 = extrude(cut_extrude3_sk1.sketch, amount=-CUT_EXTRUDE3_REACH, mode=Mode.PRIVATE) & part.part
    add(cut_extrude3_tool1.solids().sort_by_distance((-136.525, 19.05, 0))[0], mode=Mode.SUBTRACT)

    # Sketch16 → Cut-Extrude10 (cut, through all)
    with BuildSketch(Plane.XY.offset(69.85)):
        with Locations((-33.063389048, 147.183217299)):
            Rectangle(SKETCH16_W, SKETCH16_H)
    extrude(amount=-CUT_EXTRUDE10_DEPTH, mode=Mode.SUBTRACT)

    # Left/Right → Cut-Extrude11 (cut, through all)
    with BuildSketch(Plane.ZY.offset(136.525)):
        with Locations((60.325, 3.175)):
            Rectangle(LEFT_RIGHT_W, LEFT_RIGHT_H)
        with Locations((38.1, 3.175)):
            Rectangle(LEFT_RIGHT_W_2, LEFT_RIGHT_H)
        with Locations((66.675, 19.05)):
            Rectangle(LEFT_RIGHT_W, LEFT_RIGHT_H_2)
        with Locations((12.7, 3.175)):
            Rectangle(LEFT_RIGHT_W_2, LEFT_RIGHT_H)
        with Locations((66.675, 44.45)):
            Rectangle(LEFT_RIGHT_W, LEFT_RIGHT_H_2)
        with Locations((-12.7, 3.175)):
            Rectangle(LEFT_RIGHT_W_2, LEFT_RIGHT_H)
        with Locations((66.675, 69.85)):
            Rectangle(LEFT_RIGHT_W, LEFT_RIGHT_H_2)
        with Locations((-38.1, 3.175)):
            Rectangle(LEFT_RIGHT_W_2, LEFT_RIGHT_H)
        with Locations((66.675, 95.25)):
            Rectangle(LEFT_RIGHT_W, LEFT_RIGHT_H_2)
        with Locations((-60.325, 3.175)):
            Rectangle(LEFT_RIGHT_W, LEFT_RIGHT_H)
        with Locations((66.675, 120.65)):
            Rectangle(LEFT_RIGHT_W, LEFT_RIGHT_H_2)
        with Locations((-66.675, 19.05)):
            Rectangle(LEFT_RIGHT_W, LEFT_RIGHT_H_2)
        with Locations((66.675, 146.05)):
            Rectangle(LEFT_RIGHT_W, LEFT_RIGHT_H_2)
        with Locations((-66.675, 44.45)):
            Rectangle(LEFT_RIGHT_W, LEFT_RIGHT_H_2)
        with Locations((66.675, 171.45)):
            Rectangle(LEFT_RIGHT_W, LEFT_RIGHT_H_2)
        with Locations((-66.675, 69.85)):
            Rectangle(LEFT_RIGHT_W, LEFT_RIGHT_H_2)
        with Locations((66.675, 196.85)):
            Rectangle(LEFT_RIGHT_W, LEFT_RIGHT_H_2)
        with Locations((-66.675, 95.25)):
            Rectangle(LEFT_RIGHT_W, LEFT_RIGHT_H_2)
        with Locations((66.675, 222.25)):
            Rectangle(LEFT_RIGHT_W, LEFT_RIGHT_H_2)
        with Locations((-66.675, 120.65)):
            Rectangle(LEFT_RIGHT_W, LEFT_RIGHT_H_2)
        with Locations((66.675, 247.65)):
            Rectangle(LEFT_RIGHT_W, LEFT_RIGHT_H_2)
        with Locations((-66.675, 146.05)):
            Rectangle(LEFT_RIGHT_W, LEFT_RIGHT_H_2)
        with Locations((66.675, 273.05)):
            Rectangle(LEFT_RIGHT_W, LEFT_RIGHT_H_2)
        with Locations((-66.675, 171.45)):
            Rectangle(LEFT_RIGHT_W, LEFT_RIGHT_H_2)
        with Locations((66.675, 298.45)):
            Rectangle(LEFT_RIGHT_W, LEFT_RIGHT_H_2)
        with Locations((-66.675, 196.85)):
            Rectangle(LEFT_RIGHT_W, LEFT_RIGHT_H_2)
        with Locations((-66.675, 222.25)):
            Rectangle(LEFT_RIGHT_W, LEFT_RIGHT_H_2)
        with Locations((-66.675, 247.65)):
            Rectangle(LEFT_RIGHT_W, LEFT_RIGHT_H_2)
        with Locations((-66.675, 273.05)):
            Rectangle(LEFT_RIGHT_W, LEFT_RIGHT_H_2)
        with Locations((-66.675, 298.45)):
            Rectangle(LEFT_RIGHT_W, LEFT_RIGHT_H_2)
    extrude(amount=-CUT_EXTRUDE11_DEPTH, mode=Mode.SUBTRACT)


solid = part.part
